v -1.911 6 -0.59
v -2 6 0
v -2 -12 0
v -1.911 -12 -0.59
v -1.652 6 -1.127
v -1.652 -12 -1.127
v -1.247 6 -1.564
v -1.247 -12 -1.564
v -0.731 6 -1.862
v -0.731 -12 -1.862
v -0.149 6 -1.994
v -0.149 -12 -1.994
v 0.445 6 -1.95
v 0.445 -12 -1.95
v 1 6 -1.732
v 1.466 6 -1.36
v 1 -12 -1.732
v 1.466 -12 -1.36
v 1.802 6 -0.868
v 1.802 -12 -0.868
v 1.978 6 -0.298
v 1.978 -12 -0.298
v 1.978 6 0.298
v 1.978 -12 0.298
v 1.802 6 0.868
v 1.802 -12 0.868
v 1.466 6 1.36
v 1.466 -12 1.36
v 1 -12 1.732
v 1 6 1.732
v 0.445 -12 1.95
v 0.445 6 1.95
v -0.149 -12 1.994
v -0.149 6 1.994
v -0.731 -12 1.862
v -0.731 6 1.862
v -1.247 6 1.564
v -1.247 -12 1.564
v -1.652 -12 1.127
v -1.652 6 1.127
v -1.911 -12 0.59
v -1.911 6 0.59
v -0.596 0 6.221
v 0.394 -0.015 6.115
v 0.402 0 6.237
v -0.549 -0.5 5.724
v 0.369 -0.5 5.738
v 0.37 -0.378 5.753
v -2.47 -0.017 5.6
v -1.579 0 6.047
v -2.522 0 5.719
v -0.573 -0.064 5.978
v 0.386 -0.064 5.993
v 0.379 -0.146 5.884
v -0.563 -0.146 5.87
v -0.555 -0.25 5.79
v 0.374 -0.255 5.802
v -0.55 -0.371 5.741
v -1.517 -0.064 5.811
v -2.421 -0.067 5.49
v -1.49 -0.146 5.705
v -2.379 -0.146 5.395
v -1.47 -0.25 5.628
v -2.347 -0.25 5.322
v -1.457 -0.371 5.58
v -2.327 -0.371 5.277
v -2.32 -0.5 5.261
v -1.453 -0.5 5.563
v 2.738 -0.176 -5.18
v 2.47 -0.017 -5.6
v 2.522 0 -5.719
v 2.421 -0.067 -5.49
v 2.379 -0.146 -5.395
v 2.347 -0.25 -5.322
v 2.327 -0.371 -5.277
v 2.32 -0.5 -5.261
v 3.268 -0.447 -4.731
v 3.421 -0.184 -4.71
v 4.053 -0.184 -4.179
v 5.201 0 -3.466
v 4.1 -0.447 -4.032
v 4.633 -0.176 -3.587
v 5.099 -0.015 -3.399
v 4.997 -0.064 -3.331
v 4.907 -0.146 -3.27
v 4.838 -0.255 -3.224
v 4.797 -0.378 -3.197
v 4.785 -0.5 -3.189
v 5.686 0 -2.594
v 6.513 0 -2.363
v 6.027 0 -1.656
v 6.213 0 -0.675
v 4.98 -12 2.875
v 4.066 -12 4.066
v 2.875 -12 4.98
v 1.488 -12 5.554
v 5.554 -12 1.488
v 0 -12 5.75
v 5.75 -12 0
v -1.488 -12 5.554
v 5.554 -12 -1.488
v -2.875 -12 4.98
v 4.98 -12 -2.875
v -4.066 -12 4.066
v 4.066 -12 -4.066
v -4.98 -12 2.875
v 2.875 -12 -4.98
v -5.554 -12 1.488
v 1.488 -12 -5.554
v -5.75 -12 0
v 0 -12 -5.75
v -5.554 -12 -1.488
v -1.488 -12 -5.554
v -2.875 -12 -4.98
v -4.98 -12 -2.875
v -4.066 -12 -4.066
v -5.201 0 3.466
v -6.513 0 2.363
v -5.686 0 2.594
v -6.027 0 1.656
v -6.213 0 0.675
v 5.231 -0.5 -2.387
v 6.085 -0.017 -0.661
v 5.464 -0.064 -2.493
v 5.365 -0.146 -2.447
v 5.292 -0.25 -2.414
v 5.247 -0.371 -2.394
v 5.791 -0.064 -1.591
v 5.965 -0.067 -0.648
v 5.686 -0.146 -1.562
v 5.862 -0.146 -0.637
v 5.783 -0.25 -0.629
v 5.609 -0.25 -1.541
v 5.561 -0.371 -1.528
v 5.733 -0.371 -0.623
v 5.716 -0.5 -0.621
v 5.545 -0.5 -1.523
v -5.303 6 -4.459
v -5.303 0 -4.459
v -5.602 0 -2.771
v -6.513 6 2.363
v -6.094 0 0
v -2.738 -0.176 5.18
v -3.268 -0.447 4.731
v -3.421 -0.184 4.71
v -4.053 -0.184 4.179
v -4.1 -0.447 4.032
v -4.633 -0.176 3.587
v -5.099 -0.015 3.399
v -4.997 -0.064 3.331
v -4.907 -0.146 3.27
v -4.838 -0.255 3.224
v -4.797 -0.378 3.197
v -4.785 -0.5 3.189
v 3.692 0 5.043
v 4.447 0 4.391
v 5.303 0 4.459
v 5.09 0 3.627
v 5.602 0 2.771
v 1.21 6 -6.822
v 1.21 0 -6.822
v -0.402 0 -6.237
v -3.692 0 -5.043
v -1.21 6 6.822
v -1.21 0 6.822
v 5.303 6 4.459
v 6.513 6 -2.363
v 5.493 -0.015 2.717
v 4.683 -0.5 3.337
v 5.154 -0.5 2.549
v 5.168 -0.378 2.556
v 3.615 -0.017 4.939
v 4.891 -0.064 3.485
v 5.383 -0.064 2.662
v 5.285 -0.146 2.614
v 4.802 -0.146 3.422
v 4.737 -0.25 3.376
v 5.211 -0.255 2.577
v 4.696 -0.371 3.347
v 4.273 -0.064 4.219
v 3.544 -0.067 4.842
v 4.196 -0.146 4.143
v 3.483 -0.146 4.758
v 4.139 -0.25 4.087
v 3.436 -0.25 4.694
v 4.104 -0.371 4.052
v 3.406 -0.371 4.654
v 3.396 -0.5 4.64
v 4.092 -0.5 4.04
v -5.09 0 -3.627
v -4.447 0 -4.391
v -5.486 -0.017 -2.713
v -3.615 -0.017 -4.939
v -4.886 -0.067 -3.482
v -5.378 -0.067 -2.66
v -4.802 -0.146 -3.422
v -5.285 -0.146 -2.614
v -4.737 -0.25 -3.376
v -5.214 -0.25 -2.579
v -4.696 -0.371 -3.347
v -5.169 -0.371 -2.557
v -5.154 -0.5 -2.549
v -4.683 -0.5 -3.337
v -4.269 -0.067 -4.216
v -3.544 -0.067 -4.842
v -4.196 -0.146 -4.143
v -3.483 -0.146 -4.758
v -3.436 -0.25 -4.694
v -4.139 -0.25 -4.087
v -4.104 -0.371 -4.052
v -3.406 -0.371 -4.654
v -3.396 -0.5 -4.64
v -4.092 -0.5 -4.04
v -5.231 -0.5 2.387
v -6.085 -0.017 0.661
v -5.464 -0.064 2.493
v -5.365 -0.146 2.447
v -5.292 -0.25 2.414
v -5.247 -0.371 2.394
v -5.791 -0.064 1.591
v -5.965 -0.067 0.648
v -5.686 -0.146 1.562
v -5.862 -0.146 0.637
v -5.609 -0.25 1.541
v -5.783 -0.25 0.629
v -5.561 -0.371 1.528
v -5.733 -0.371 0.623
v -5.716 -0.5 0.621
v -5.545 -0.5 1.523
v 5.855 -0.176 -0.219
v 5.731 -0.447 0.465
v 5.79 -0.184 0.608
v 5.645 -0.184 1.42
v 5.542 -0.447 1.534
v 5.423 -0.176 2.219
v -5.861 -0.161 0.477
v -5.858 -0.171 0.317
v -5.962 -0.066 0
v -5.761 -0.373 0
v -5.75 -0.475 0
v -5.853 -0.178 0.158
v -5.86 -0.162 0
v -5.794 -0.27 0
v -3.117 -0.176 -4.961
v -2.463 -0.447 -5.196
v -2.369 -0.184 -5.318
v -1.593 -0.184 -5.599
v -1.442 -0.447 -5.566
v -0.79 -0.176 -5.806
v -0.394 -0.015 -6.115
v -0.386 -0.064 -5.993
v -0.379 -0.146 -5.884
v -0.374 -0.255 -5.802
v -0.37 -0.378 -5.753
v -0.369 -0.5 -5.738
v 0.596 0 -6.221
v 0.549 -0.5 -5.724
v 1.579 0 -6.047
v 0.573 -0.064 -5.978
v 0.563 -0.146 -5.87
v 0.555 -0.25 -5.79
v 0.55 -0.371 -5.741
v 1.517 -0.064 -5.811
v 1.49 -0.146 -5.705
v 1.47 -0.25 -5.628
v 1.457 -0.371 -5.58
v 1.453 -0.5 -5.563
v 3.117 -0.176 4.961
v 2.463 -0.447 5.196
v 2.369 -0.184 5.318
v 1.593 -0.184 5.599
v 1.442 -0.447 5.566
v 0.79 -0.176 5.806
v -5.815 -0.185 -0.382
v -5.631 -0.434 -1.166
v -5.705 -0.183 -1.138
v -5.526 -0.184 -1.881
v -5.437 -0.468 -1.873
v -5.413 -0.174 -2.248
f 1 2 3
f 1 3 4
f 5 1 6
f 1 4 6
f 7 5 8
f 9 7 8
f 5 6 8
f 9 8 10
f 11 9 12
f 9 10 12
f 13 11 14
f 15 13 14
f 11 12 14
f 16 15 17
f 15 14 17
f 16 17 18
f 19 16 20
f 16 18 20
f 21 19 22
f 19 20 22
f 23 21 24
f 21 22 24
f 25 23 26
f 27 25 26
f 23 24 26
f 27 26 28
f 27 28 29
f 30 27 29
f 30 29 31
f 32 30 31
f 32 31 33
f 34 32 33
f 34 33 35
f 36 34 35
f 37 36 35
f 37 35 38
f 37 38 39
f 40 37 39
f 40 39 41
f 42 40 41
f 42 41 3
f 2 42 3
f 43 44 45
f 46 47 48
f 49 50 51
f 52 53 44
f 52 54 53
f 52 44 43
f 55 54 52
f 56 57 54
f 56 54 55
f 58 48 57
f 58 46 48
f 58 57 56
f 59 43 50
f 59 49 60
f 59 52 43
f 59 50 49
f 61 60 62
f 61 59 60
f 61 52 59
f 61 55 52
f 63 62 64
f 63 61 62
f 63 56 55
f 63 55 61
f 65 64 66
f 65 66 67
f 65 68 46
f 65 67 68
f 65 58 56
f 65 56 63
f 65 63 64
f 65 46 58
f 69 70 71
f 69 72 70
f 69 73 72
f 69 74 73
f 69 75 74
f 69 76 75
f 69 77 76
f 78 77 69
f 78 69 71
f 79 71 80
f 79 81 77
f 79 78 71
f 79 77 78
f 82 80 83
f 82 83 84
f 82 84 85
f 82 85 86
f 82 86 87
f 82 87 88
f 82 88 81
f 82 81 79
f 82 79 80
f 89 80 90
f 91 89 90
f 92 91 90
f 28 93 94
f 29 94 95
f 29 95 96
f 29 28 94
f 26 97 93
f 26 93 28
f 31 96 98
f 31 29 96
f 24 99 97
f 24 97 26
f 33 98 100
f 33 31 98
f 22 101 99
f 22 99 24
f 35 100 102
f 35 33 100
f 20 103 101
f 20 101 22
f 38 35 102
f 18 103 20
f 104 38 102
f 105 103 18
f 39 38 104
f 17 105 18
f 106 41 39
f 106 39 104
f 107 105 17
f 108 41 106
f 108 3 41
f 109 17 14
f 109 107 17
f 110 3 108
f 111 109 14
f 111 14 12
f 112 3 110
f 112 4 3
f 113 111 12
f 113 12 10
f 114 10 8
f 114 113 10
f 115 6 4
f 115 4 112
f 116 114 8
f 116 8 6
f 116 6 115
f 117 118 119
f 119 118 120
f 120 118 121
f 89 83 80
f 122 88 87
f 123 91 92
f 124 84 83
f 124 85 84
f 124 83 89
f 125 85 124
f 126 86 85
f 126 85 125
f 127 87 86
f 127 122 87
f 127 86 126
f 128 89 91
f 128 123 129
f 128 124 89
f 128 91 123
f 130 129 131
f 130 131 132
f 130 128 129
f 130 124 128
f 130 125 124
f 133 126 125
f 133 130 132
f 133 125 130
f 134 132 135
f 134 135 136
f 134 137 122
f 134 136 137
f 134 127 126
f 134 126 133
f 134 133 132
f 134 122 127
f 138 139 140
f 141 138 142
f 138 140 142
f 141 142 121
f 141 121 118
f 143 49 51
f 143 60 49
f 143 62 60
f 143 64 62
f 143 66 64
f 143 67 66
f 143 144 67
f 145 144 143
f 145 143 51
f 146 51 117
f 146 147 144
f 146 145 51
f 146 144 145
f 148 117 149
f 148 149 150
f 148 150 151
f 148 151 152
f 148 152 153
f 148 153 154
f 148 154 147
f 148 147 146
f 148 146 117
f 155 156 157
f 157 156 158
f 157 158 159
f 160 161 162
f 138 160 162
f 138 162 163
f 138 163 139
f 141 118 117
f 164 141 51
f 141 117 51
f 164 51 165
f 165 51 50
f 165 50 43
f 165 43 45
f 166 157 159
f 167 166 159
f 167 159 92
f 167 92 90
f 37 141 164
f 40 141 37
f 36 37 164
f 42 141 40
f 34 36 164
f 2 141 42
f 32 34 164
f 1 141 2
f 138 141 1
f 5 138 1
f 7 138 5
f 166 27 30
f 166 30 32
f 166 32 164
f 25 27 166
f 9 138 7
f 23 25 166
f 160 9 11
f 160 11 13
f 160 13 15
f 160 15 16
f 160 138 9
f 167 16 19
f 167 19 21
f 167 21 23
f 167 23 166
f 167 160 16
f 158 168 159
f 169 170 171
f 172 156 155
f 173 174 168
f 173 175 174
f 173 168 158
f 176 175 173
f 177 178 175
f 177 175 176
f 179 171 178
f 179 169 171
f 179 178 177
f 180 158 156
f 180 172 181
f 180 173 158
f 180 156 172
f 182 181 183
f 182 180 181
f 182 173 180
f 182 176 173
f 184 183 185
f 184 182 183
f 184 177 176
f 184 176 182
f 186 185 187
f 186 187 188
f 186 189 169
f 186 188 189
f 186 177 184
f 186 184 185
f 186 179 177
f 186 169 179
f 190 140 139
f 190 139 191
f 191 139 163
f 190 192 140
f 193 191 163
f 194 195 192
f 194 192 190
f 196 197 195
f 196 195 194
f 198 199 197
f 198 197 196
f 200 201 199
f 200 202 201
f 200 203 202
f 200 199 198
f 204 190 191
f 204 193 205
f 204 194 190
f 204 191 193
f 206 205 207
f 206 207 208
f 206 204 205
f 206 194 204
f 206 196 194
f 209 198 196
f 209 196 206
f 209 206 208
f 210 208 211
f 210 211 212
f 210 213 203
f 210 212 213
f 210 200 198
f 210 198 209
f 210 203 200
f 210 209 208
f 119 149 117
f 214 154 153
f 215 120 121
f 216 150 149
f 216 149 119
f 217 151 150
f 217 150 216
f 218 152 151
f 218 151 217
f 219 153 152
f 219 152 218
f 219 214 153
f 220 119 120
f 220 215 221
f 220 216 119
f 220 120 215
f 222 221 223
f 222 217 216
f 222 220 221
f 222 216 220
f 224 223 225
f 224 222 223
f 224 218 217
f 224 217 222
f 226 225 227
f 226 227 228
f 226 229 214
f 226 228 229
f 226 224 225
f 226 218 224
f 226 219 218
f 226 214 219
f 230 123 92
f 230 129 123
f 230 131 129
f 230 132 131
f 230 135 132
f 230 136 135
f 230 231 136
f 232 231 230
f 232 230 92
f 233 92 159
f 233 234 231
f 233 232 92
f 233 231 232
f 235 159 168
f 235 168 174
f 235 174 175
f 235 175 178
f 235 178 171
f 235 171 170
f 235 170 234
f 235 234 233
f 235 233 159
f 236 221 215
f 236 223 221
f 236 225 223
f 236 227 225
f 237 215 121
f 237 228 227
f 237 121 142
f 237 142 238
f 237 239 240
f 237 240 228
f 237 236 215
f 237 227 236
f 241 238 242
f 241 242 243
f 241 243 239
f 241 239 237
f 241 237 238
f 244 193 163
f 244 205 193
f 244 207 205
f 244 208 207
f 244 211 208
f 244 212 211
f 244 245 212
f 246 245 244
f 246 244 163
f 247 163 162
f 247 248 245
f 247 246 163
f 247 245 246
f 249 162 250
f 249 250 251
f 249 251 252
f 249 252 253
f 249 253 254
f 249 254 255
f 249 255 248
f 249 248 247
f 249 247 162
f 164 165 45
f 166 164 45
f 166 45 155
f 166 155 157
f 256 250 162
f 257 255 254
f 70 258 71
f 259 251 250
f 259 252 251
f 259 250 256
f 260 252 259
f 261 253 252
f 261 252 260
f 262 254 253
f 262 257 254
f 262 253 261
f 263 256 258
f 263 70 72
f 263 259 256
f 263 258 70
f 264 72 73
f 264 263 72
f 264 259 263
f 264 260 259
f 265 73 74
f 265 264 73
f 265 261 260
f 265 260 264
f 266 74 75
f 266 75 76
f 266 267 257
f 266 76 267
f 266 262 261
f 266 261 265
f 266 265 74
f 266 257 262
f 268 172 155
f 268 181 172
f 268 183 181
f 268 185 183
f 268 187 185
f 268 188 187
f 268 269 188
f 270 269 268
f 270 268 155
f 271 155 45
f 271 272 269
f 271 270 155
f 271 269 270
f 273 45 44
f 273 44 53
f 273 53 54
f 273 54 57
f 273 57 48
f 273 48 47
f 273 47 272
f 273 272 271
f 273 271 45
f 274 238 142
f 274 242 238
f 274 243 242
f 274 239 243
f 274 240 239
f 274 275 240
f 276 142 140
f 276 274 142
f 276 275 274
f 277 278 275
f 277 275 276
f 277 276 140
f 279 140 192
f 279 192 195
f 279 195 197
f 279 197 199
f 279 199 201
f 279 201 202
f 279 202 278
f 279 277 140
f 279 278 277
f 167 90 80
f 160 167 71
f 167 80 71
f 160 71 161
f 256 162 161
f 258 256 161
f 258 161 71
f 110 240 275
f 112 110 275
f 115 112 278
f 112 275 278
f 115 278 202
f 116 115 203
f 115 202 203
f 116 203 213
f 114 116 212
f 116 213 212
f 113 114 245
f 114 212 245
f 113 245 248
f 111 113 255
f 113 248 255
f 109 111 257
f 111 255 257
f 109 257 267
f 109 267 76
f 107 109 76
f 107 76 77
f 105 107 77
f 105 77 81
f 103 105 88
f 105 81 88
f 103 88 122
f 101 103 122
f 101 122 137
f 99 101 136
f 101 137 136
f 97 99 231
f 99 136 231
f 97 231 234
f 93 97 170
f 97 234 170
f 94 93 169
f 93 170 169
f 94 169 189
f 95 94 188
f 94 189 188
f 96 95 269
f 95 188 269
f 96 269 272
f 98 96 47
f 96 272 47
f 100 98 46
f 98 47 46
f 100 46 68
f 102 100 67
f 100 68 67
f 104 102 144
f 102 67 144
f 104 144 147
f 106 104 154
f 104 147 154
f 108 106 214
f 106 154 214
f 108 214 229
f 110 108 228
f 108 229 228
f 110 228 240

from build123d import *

# Parameters (mm, degrees)
BOSS_EXTRUDE1_DEPTH = 6
SKETCH2_R           = 5.75
BOSS_EXTRUDE2_DEPTH = 12
FILLET1_R           = 0.5
SKETCH3_R           = 2
CUT_EXTRUDE1_DEPTH  = 19.0000001


with BuildPart() as part:
    # Sketch1 → Boss-Extrude1 (new body)
    with BuildSketch(Plane(origin=(0, 0, 0), x_dir=(1, 0, 0), z_dir=(0, 1, 0))):
        Polygon((1.209770832, 6.821763301), (-5.302934901, 4.458573924), (-6.512705733, -2.363189377), (-1.209770832, -6.821763301), (5.302934901, -4.458573924), (6.512705733, 2.363189377), align=None)
    extrude(amount=BOSS_EXTRUDE1_DEPTH)

    # Sketch2 → Boss-Extrude2 (add)
    with BuildSketch(Plane(origin=(0, 0, 0), x_dir=(-1, 0, 0), z_dir=(0, -1, 0))):
        Circle(SKETCH2_R)
    extrude(amount=BOSS_EXTRUDE2_DEPTH)

    # Fillet1
    fillet1_edges = [part.edges().sort_by_distance(p)[0] for p in [
        (5.75, 0, 0),
    ]]
    fillet(fillet1_edges, radius=FILLET1_R)

    # Sketch3 → Cut-Extrude1 (cut, through all)
    with BuildSketch(Plane(origin=(0, -12, 0), x_dir=(-1, 0, 0), z_dir=(0, -1, 0))):
        Circle(SKETCH3_R)
    extrude(amount=-CUT_EXTRUDE1_DEPTH, mode=Mode.SUBTRACT)


solid = part.part
